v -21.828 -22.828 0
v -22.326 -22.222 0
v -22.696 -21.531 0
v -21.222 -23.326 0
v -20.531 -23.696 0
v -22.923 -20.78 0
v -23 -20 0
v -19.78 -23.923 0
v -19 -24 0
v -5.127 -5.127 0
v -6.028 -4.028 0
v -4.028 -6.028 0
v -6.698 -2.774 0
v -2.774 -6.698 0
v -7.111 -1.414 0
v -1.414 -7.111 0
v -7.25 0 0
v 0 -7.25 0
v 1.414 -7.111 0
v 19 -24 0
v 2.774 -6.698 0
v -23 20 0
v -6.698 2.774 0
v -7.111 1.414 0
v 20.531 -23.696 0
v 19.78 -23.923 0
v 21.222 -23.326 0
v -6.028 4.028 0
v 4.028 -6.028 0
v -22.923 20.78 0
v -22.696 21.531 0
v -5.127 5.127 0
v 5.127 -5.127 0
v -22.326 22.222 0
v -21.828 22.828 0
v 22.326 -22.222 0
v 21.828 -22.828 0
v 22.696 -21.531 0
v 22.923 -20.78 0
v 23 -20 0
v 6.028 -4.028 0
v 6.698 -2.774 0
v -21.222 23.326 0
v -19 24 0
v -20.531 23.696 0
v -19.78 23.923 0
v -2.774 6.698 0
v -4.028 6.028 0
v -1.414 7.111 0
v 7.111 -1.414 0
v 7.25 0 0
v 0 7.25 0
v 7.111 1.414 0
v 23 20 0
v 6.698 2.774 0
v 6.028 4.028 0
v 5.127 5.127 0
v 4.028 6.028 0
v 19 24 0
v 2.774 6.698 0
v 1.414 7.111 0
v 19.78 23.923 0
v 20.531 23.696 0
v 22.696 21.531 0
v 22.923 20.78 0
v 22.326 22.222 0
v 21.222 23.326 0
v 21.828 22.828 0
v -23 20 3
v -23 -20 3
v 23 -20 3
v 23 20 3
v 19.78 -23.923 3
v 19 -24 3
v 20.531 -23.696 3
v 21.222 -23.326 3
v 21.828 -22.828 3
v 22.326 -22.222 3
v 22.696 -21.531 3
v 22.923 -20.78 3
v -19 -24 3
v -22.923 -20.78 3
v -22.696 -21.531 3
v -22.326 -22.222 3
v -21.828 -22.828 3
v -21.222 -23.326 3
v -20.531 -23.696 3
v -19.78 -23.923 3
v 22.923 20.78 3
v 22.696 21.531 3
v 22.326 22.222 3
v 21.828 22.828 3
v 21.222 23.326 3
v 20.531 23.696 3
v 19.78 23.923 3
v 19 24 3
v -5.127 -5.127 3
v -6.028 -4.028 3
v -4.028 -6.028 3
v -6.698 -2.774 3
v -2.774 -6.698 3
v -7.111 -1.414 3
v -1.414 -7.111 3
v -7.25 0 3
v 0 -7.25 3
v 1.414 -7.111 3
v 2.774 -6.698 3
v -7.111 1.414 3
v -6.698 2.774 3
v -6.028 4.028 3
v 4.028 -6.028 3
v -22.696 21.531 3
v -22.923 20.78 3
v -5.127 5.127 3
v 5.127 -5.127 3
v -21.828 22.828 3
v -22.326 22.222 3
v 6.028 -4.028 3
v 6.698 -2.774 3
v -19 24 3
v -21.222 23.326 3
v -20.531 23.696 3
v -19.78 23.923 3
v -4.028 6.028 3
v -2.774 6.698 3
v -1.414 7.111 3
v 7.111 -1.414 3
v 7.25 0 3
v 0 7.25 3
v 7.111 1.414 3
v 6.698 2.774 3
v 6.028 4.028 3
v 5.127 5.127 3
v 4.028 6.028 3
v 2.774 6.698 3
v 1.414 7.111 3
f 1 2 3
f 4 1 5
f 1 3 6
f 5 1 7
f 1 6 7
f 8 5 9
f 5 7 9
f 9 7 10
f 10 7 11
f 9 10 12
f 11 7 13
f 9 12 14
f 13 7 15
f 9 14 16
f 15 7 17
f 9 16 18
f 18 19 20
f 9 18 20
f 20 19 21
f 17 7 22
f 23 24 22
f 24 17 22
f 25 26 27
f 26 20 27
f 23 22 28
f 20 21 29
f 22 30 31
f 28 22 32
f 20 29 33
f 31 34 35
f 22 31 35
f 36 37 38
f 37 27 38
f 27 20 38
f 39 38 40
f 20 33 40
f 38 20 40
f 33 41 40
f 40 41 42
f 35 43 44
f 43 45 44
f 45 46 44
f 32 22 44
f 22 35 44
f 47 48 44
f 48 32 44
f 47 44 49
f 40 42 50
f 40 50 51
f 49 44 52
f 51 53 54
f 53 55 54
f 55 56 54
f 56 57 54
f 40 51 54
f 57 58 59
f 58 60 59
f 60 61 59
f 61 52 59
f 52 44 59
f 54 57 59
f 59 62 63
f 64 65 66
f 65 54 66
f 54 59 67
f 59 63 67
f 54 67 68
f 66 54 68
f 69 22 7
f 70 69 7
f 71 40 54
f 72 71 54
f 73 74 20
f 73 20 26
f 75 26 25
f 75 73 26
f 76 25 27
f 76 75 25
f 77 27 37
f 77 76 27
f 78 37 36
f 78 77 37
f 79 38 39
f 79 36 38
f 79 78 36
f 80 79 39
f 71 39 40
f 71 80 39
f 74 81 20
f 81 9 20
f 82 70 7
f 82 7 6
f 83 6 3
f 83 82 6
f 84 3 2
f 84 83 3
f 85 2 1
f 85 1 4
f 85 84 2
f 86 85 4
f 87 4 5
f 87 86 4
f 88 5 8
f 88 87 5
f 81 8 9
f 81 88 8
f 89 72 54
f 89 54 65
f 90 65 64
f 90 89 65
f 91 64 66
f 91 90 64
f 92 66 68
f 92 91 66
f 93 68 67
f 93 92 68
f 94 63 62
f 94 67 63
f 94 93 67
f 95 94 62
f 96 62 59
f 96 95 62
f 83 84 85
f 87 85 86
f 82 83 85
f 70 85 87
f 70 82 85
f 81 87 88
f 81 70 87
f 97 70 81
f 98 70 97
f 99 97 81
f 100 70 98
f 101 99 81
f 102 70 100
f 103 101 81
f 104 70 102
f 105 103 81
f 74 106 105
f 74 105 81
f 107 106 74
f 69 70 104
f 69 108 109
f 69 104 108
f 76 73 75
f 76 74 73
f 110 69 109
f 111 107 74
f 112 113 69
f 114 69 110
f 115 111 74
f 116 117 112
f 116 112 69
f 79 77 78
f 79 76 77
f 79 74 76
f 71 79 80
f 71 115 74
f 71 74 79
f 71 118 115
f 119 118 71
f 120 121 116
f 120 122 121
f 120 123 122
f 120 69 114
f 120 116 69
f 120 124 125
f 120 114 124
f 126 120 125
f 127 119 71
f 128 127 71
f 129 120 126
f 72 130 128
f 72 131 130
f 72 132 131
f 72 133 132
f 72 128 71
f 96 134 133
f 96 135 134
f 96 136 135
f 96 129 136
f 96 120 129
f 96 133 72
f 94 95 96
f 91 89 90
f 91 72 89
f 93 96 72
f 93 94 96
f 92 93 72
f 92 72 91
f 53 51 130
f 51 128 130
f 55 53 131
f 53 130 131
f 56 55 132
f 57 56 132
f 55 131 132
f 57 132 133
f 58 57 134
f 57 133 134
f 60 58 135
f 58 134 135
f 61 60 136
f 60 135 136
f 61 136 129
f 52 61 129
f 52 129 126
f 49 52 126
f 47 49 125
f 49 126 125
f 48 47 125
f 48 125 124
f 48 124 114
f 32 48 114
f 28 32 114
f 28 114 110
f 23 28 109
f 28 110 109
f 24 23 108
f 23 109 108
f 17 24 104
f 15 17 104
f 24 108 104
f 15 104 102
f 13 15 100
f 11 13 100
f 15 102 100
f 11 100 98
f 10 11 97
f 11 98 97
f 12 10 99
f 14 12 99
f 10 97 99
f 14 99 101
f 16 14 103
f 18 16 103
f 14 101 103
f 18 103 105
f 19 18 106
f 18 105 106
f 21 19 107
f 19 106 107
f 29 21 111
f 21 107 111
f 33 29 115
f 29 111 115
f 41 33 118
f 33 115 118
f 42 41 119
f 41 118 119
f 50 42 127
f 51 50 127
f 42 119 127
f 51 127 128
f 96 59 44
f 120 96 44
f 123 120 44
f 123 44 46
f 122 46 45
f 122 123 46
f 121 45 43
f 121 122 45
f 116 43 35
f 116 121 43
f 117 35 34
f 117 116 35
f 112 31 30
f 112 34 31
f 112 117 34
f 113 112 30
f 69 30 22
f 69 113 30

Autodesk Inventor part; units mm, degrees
ref_plane "YZ Plane" through (0, 0, 0) normal (1, 0, 0) x (0, 1, 0)
ref_plane "XZ Plane" through (0, 0, 0) normal (0, 1, 0) x (-1, 0, 0)
ref_plane "XY Plane" through (0, 0, 0) normal (0, 0, 1) x (1, 0, 0)
sketch "Sketch1" plane through (0, 0, 0) normal (0, 0, 1) x (1, 0, 0)
  line L0 (-23, -24) -> (23, -24)
  line L1 (23, -24) -> (23, 24)
  line L2 (23, 24) -> (-23, 24)
  line L3 (-23, 24) -> (-23, -24)
  line L4 (-23, -24) -> (23, 24) construction
  line L5 (23, -24) -> (-23, 24) construction
  point P0 (0, 0)
  dimension "d0" = 46
  dimension "d1" = 48
extrude "Plate1" add sketch "Sketch1" along normal blind 3
fillet "Corner Round1" radius 4 4 edges at (23, -24, 1.5) (23, 24, 1.5) (-23, -24, 1.5) (-23, 24, 1.5)
sketch "Sketch2" plane through (0, 0, 3) normal (0, 0, 1) x (1, 0, 0)
  circle A0 centre (0, 0) radius 7.25
  dimension "d4" = 14.5
extrude "Extrusion1" cut sketch "Sketch2" against normal through all
equation "\"d2\" = Thickness"
equation "\"BendRadius\" = Thickness"
equation "\"BendReliefWidth\" = Thickness"
equation "\"BendReliefDepth\" = 0.5 * Thickness"
equation "\"CornerReliefSize\" = 4 * Thickness"
equation "\"MinimumRemnant\" = 2 * Thickness"
equation "\"TransitionRadius\" = BendRadius"
equation "\"JacobiRadiusSize\" = BendRadius"
equation "\"GapSize\" = Thickness"
equation "\"Thickness\" = 3"
properties part number "NDM 4.0.2  base plate" material "Stainless Steel"
